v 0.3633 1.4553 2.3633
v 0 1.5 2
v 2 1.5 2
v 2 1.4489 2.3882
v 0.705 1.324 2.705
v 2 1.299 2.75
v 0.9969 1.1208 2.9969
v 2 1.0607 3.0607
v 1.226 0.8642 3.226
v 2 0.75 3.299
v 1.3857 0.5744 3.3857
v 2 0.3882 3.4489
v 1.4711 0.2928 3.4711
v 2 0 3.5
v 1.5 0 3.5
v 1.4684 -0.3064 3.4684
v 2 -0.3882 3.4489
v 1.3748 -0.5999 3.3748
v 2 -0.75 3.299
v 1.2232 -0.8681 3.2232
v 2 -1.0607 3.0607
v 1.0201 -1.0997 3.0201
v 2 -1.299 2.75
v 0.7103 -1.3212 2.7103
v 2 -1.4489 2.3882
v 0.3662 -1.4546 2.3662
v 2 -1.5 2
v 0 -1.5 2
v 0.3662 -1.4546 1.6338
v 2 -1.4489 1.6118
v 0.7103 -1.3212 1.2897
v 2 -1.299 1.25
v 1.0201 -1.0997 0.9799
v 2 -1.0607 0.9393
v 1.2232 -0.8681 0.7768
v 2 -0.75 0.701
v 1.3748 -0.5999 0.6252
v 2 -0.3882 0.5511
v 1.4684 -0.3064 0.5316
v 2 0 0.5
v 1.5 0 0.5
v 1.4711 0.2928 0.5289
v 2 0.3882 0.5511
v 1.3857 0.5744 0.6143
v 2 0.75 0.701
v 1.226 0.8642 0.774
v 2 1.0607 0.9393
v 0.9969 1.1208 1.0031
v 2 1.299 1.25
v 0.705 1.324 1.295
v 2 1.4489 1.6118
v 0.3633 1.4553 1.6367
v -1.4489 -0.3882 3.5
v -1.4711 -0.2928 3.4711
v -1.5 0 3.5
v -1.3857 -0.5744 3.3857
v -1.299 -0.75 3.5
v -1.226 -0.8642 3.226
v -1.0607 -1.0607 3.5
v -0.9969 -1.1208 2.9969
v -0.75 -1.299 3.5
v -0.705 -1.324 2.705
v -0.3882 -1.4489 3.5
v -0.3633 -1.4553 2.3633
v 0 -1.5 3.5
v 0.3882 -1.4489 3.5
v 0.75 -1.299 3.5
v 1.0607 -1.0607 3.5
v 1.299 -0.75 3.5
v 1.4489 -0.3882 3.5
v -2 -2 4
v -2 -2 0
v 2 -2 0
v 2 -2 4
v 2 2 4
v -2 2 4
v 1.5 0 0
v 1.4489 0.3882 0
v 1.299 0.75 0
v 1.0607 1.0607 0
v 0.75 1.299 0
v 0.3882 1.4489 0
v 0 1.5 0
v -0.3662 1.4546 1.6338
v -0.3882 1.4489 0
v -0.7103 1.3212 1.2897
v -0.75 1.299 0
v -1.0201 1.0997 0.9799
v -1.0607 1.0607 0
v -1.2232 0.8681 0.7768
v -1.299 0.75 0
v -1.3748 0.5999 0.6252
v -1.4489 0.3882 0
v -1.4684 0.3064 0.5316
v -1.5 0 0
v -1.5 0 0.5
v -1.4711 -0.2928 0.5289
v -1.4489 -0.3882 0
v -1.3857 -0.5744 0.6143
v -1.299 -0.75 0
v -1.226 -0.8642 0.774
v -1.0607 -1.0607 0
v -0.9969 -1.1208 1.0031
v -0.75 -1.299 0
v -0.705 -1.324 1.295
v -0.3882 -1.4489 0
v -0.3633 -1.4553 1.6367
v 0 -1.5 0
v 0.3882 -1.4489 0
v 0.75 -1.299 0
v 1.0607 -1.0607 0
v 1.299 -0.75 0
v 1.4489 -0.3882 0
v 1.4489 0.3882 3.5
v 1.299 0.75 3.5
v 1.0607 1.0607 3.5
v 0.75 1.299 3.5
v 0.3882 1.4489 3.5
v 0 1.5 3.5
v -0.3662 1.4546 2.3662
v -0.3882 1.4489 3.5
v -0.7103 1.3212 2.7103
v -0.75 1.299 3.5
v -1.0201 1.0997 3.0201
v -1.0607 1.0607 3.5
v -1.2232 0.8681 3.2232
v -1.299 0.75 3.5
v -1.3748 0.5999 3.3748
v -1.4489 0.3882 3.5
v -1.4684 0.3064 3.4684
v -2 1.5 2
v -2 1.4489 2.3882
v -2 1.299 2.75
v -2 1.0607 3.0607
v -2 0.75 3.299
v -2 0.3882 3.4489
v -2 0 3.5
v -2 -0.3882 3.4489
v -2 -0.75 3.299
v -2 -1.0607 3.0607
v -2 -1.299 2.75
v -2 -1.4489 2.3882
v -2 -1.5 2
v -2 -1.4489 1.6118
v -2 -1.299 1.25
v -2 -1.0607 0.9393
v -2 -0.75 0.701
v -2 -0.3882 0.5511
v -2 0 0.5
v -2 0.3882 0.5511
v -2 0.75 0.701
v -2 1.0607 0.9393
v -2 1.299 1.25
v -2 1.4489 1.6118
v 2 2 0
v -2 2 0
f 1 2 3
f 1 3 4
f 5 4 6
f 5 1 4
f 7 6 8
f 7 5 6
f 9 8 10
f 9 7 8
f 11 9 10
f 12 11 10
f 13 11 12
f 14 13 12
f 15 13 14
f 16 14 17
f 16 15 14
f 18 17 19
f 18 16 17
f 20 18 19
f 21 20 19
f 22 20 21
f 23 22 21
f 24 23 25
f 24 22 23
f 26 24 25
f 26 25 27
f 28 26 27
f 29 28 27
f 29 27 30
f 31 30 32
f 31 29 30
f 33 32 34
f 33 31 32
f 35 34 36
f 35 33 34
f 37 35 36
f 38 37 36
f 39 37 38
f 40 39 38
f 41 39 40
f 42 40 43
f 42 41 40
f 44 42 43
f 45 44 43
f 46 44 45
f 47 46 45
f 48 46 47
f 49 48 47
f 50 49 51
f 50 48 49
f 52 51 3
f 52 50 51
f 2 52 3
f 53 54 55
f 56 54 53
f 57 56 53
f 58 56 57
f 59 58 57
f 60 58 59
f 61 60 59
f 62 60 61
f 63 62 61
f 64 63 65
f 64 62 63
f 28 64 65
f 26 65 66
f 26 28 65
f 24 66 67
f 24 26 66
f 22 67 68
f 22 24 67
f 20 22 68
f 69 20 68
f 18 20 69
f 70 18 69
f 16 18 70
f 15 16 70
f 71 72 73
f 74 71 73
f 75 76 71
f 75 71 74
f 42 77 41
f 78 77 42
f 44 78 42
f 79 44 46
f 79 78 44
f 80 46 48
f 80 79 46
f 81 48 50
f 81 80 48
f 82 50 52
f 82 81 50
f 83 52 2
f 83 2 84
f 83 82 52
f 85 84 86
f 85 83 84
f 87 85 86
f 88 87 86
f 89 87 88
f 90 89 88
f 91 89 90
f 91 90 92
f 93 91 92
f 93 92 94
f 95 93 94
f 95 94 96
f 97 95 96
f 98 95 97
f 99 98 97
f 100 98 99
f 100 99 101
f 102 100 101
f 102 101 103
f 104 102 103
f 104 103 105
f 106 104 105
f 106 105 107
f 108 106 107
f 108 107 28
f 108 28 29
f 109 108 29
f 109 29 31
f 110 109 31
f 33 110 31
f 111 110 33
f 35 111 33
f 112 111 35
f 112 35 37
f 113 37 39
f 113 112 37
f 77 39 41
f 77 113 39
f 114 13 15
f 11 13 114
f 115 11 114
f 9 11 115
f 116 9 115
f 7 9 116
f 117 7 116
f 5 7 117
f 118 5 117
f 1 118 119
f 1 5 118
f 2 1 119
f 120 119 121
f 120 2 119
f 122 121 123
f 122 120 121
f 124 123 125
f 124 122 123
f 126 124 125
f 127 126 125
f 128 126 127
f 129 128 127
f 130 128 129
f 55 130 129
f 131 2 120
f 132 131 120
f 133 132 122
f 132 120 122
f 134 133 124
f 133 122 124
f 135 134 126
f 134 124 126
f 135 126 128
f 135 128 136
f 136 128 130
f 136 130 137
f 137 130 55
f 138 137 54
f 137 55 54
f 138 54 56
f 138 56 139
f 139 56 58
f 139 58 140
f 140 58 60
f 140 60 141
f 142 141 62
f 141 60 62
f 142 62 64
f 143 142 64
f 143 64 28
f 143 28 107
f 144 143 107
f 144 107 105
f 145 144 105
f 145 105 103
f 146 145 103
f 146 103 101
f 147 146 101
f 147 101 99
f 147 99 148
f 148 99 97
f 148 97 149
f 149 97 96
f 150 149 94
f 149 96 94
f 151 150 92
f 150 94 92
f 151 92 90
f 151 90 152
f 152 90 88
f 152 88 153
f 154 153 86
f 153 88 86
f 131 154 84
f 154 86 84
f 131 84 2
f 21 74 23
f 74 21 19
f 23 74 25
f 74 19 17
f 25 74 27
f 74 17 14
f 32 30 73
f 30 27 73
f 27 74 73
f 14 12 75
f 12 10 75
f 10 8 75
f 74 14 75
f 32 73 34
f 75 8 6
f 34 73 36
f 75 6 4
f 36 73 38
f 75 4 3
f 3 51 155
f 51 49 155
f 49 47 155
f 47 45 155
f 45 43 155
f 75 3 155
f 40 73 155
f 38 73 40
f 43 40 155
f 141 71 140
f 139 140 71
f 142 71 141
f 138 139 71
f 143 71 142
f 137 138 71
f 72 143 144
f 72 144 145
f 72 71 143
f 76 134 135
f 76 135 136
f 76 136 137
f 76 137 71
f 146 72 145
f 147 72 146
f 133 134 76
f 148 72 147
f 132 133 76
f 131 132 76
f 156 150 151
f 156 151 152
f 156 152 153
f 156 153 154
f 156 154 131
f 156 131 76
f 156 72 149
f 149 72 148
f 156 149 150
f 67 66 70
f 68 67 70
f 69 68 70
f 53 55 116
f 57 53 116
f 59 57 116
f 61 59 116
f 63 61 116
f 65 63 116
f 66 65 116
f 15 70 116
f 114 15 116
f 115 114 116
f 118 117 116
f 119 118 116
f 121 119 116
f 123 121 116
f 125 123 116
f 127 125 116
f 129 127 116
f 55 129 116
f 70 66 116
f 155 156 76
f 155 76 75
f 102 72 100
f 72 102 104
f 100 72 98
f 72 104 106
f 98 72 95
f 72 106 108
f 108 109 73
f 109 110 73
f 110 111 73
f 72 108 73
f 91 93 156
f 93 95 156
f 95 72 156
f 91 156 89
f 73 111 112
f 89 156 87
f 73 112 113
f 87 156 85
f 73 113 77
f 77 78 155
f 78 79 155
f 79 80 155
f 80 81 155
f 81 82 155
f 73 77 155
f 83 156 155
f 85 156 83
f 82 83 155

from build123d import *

# Parameters (mm, degrees)
F0_W          = 4
F0_H          = 4
F1_DEPTH      = 4
F2_R          = 1.5
F3_DEPTH      = 3.5
F4_R          = 1.5
F5_DEPTH      = 25.4
F5_DEPTH_BACK = 25.4


with BuildPart() as f1:
    # F0 (on Top) → F1 (new body)
    with BuildSketch(Plane.XY):
        Rectangle(F0_W, F0_H)
    extrude(amount=F1_DEPTH)

    # F2 (on Top) → F3 (cut)
    with BuildSketch(Plane.XY):
        Circle(F2_R)
    extrude(amount=F3_DEPTH, mode=Mode.SUBTRACT)

    # F4 (on Right) → F5 (cut, two sides)
    with BuildSketch(Plane.YZ) as f5_sk:
        with Locations((0, 2)):
            Circle(F4_R)
    extrude(amount=-F5_DEPTH, mode=Mode.SUBTRACT)
    extrude(f5_sk.sketch, amount=F5_DEPTH_BACK, mode=Mode.SUBTRACT)


solid = f1.part
